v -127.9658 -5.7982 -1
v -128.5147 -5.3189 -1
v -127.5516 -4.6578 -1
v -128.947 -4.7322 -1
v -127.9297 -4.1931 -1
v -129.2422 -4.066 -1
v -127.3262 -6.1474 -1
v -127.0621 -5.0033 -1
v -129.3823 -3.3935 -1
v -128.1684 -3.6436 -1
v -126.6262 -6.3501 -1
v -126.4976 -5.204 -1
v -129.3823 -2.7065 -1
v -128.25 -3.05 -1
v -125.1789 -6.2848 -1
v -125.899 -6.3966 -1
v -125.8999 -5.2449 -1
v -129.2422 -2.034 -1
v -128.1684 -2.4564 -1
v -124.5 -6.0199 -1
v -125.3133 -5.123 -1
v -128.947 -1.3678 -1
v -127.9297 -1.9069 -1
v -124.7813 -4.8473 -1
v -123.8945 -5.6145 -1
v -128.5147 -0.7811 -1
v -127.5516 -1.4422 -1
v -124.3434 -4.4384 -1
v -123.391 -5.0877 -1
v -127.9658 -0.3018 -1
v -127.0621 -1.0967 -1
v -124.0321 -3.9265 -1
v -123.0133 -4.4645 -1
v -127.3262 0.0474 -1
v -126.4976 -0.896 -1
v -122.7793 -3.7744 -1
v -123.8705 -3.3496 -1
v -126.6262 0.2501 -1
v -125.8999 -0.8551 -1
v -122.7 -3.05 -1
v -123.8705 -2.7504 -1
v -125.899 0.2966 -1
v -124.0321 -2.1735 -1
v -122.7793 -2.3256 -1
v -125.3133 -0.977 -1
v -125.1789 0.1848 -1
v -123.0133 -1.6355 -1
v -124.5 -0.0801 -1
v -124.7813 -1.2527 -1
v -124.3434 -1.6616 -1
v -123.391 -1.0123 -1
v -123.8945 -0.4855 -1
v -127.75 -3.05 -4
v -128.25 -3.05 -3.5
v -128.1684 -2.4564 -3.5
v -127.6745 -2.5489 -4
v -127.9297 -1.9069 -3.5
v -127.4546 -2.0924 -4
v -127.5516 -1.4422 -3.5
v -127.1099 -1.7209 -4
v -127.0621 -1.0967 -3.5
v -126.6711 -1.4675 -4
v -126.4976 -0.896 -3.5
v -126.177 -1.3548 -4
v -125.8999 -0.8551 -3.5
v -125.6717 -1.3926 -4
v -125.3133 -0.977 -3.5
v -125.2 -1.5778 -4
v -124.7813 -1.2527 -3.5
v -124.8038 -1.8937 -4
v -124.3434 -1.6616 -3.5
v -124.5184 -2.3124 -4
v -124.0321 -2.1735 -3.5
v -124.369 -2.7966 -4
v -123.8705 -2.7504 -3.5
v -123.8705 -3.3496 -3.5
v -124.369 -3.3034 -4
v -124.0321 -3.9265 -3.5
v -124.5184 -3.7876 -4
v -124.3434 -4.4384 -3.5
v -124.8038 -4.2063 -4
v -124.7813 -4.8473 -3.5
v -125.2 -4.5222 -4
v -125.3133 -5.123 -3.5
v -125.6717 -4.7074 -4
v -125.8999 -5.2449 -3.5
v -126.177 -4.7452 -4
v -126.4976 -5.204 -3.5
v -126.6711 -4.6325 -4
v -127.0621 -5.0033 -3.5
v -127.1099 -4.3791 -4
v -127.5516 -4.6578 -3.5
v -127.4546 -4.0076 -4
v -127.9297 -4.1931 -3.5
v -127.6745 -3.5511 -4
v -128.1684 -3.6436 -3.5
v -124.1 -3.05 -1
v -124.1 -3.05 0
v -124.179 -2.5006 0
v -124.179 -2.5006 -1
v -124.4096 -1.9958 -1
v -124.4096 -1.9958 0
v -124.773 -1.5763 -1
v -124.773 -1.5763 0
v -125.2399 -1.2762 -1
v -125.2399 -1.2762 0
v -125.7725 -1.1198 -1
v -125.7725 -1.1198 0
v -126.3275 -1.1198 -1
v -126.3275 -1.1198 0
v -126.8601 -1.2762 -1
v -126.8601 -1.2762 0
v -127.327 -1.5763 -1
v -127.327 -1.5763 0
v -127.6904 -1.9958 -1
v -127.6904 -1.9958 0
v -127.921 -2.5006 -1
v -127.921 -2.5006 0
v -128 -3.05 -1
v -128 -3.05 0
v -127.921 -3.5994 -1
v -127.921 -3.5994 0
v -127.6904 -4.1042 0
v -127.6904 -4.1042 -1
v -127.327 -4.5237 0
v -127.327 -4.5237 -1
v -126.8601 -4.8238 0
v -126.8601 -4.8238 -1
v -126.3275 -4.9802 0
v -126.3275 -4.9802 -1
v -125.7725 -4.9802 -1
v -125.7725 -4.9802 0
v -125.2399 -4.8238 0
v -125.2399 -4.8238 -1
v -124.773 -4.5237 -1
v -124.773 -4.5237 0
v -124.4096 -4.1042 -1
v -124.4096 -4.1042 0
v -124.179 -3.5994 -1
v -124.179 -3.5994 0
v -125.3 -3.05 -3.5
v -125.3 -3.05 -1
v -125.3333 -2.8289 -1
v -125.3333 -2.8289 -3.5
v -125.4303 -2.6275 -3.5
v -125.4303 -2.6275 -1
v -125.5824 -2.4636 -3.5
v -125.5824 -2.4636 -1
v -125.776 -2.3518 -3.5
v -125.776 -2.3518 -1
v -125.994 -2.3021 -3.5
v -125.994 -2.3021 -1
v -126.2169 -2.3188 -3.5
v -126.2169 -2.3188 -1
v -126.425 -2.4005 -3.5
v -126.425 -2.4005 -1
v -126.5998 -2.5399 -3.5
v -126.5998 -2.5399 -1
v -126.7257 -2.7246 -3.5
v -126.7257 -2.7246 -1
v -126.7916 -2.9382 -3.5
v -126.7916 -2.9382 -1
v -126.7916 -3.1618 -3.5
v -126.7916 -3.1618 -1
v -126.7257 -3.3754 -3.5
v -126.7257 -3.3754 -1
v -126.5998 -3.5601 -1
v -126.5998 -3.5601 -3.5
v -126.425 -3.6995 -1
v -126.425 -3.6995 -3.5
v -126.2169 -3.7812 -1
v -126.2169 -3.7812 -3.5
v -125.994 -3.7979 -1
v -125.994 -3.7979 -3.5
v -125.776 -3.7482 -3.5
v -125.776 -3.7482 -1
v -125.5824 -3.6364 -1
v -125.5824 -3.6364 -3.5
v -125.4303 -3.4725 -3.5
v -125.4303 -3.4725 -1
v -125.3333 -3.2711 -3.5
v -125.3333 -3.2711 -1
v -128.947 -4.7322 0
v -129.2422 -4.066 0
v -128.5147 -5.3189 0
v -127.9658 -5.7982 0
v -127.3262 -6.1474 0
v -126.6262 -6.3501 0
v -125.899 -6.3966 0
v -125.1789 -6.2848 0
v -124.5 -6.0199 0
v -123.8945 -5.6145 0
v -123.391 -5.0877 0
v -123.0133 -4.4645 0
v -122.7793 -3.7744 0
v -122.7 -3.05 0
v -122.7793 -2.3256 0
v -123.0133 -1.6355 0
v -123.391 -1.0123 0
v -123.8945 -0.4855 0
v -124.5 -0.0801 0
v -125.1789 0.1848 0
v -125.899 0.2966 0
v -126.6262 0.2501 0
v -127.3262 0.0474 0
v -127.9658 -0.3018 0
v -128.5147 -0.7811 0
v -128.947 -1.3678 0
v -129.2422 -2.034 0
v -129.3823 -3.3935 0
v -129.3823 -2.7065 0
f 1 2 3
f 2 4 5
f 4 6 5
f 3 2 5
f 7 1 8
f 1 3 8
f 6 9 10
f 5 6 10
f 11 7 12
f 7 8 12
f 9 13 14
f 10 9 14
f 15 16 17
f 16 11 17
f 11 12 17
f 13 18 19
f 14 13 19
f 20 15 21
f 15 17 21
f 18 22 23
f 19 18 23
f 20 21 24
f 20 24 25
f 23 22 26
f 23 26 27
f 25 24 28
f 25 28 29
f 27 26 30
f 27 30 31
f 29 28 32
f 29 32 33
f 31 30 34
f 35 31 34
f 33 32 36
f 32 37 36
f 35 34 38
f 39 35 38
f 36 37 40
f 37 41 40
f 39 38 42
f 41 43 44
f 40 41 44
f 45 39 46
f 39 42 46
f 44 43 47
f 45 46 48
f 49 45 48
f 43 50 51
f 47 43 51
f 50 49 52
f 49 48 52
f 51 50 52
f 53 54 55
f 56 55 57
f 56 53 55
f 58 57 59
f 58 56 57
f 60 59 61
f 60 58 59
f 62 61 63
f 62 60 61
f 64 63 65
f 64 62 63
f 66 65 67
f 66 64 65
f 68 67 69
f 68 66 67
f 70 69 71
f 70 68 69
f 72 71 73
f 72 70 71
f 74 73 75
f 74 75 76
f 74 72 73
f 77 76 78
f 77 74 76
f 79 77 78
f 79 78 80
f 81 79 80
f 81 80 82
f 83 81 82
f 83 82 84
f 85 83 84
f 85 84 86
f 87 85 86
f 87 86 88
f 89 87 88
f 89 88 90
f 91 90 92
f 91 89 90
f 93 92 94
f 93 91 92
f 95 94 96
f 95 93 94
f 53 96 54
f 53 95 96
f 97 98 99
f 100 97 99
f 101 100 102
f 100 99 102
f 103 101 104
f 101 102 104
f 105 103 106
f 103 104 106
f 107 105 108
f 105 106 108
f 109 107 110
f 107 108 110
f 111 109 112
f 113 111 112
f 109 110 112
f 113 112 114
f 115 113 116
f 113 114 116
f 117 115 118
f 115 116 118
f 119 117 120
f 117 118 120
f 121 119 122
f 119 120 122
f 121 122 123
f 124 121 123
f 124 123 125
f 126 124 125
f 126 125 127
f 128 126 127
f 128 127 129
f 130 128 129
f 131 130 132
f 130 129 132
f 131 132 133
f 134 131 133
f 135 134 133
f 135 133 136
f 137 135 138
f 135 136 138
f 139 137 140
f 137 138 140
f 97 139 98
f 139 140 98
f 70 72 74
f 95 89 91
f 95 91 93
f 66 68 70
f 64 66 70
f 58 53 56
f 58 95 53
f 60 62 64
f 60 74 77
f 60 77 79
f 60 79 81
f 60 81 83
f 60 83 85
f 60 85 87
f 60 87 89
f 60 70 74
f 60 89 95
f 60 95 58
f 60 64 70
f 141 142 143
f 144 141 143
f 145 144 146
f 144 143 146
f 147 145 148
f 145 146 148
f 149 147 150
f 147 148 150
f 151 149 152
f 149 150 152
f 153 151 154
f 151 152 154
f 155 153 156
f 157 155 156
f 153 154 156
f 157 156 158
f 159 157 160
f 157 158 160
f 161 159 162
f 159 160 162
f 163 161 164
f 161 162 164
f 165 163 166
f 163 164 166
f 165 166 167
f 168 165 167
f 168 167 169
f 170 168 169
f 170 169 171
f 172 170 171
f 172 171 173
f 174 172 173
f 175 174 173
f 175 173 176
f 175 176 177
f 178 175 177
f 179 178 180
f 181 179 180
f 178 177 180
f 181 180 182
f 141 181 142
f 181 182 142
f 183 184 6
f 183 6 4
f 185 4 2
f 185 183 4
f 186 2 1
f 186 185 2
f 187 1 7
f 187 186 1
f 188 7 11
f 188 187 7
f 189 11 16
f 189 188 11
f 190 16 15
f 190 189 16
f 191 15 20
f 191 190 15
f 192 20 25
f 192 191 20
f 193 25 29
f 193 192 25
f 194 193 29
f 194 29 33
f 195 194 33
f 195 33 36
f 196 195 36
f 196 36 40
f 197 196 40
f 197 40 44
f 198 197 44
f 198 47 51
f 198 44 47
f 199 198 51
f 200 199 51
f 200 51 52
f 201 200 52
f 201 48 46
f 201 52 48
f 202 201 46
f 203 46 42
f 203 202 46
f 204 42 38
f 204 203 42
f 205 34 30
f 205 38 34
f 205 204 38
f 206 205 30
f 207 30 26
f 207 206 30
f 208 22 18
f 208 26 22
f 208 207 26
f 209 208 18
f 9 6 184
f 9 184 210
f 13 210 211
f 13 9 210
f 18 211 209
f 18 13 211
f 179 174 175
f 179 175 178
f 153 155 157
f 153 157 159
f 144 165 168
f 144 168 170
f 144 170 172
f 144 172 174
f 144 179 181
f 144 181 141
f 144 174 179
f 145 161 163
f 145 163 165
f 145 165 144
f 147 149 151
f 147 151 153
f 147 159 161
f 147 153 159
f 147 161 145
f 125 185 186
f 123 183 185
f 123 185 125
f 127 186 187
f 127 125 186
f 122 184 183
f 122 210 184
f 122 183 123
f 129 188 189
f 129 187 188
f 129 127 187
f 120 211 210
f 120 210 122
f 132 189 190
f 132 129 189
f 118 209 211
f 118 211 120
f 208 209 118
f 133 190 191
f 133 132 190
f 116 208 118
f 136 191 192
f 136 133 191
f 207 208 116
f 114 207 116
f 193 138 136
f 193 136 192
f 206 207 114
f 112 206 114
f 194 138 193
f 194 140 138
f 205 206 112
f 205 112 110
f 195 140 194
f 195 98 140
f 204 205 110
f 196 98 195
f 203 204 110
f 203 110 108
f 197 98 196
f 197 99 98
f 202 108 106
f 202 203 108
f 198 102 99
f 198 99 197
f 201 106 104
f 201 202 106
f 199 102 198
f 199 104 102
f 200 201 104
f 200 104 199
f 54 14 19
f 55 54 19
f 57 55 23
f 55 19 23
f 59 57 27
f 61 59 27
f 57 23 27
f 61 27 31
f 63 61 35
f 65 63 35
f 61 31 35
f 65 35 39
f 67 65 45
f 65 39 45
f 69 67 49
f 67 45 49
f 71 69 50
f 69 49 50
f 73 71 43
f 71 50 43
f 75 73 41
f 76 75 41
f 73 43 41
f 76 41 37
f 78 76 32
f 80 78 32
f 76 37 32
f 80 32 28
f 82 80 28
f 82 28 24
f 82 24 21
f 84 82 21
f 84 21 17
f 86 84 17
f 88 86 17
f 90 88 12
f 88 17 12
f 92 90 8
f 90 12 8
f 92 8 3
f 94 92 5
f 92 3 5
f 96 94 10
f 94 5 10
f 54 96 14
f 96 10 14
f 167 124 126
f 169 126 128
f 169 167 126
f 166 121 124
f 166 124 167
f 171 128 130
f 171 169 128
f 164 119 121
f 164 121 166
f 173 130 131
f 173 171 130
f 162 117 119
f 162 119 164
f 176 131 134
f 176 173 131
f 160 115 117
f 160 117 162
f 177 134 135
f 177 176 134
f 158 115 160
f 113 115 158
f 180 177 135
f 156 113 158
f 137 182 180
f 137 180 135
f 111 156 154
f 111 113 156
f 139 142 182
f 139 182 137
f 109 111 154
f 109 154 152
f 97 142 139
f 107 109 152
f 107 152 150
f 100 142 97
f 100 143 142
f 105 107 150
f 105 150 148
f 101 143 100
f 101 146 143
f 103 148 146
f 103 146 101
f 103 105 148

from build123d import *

# Parameters (mm, degrees)
BOSS_EXTRUDE1_DEPTH = 1
SKETCH2_R           = 2.2
BOSS_EXTRUDE2_DEPTH = 3
CHAMFER1_SIZE       = 0.5
SKETCH4_R           = 1.95
CUT_EXTRUDE1_DEPTH  = 1
SKETCH5_R           = 0.75
CUT_EXTRUDE2_DEPTH  = 2.5
SKETCH6_R           = 6.375289794
SKETCH6_R_2         = 3.35
CUT_EXTRUDE3_DEPTH  = 133.169724505


with BuildPart() as part:
    # Sketch1 → Boss-Extrude1 (new body)
    with BuildSketch(Plane.XY):
        with BuildLine():
            Line((-129.242211844, -2.033986447), (-131.980589769, -2.033986447))
            Line((-131.980589769, -2.033986447), (-131.980589769, -4.066013553))
            Line((-131.980589769, -4.066013553), (-129.242211844, -4.066013553))
            ThreePointArc((-129.242211844, -4.066013553), (-122.699999999, -3.05), (-129.242211844, -2.033986447))
        make_face()
    extrude(amount=-BOSS_EXTRUDE1_DEPTH)

    # Sketch2 → Boss-Extrude2 (add)
    with BuildSketch(Plane(origin=(0, 0, -1), x_dir=(-1, 0, 0), z_dir=(0, 0, -1))):
        with Locations((126.049999999, -3.05)):
            Circle(SKETCH2_R)
    extrude(amount=BOSS_EXTRUDE2_DEPTH)

    # Chamfer1
    chamfer1_edges = [part.edges().sort_by_distance(p)[0] for p in [
        (-123.849999999, -3.05, -4),
    ]]
    chamfer(chamfer1_edges, length=CHAMFER1_SIZE)

    # Sketch4 → Cut-Extrude1 (cut)
    with BuildSketch(Plane.XY):
        with Locations((-126.049999999, -3.05)):
            Circle(SKETCH4_R)
    extrude(amount=-CUT_EXTRUDE1_DEPTH, mode=Mode.SUBTRACT)

    # Sketch5 → Cut-Extrude2 (cut)
    with BuildSketch(Plane.XY.offset(-1)):
        with Locations((-126.049999999, -3.05)):
            Circle(SKETCH5_R)
    extrude(amount=-CUT_EXTRUDE2_DEPTH, mode=Mode.SUBTRACT)

    # Sketch6 → Cut-Extrude3 (cut, through all)
    with BuildSketch(Plane(origin=(0, 0, -1), x_dir=(-1, 0, 0), z_dir=(0, 0, -1))):
        with Locations((126.049999999, -3.05)):
            Circle(SKETCH6_R)
        with Locations(Location((126.049999999, -3.05, 0), (0, 0, 180))):
            Circle(SKETCH6_R_2, mode=Mode.SUBTRACT)
    extrude(amount=-CUT_EXTRUDE3_DEPTH, mode=Mode.SUBTRACT)


solid = part.part
